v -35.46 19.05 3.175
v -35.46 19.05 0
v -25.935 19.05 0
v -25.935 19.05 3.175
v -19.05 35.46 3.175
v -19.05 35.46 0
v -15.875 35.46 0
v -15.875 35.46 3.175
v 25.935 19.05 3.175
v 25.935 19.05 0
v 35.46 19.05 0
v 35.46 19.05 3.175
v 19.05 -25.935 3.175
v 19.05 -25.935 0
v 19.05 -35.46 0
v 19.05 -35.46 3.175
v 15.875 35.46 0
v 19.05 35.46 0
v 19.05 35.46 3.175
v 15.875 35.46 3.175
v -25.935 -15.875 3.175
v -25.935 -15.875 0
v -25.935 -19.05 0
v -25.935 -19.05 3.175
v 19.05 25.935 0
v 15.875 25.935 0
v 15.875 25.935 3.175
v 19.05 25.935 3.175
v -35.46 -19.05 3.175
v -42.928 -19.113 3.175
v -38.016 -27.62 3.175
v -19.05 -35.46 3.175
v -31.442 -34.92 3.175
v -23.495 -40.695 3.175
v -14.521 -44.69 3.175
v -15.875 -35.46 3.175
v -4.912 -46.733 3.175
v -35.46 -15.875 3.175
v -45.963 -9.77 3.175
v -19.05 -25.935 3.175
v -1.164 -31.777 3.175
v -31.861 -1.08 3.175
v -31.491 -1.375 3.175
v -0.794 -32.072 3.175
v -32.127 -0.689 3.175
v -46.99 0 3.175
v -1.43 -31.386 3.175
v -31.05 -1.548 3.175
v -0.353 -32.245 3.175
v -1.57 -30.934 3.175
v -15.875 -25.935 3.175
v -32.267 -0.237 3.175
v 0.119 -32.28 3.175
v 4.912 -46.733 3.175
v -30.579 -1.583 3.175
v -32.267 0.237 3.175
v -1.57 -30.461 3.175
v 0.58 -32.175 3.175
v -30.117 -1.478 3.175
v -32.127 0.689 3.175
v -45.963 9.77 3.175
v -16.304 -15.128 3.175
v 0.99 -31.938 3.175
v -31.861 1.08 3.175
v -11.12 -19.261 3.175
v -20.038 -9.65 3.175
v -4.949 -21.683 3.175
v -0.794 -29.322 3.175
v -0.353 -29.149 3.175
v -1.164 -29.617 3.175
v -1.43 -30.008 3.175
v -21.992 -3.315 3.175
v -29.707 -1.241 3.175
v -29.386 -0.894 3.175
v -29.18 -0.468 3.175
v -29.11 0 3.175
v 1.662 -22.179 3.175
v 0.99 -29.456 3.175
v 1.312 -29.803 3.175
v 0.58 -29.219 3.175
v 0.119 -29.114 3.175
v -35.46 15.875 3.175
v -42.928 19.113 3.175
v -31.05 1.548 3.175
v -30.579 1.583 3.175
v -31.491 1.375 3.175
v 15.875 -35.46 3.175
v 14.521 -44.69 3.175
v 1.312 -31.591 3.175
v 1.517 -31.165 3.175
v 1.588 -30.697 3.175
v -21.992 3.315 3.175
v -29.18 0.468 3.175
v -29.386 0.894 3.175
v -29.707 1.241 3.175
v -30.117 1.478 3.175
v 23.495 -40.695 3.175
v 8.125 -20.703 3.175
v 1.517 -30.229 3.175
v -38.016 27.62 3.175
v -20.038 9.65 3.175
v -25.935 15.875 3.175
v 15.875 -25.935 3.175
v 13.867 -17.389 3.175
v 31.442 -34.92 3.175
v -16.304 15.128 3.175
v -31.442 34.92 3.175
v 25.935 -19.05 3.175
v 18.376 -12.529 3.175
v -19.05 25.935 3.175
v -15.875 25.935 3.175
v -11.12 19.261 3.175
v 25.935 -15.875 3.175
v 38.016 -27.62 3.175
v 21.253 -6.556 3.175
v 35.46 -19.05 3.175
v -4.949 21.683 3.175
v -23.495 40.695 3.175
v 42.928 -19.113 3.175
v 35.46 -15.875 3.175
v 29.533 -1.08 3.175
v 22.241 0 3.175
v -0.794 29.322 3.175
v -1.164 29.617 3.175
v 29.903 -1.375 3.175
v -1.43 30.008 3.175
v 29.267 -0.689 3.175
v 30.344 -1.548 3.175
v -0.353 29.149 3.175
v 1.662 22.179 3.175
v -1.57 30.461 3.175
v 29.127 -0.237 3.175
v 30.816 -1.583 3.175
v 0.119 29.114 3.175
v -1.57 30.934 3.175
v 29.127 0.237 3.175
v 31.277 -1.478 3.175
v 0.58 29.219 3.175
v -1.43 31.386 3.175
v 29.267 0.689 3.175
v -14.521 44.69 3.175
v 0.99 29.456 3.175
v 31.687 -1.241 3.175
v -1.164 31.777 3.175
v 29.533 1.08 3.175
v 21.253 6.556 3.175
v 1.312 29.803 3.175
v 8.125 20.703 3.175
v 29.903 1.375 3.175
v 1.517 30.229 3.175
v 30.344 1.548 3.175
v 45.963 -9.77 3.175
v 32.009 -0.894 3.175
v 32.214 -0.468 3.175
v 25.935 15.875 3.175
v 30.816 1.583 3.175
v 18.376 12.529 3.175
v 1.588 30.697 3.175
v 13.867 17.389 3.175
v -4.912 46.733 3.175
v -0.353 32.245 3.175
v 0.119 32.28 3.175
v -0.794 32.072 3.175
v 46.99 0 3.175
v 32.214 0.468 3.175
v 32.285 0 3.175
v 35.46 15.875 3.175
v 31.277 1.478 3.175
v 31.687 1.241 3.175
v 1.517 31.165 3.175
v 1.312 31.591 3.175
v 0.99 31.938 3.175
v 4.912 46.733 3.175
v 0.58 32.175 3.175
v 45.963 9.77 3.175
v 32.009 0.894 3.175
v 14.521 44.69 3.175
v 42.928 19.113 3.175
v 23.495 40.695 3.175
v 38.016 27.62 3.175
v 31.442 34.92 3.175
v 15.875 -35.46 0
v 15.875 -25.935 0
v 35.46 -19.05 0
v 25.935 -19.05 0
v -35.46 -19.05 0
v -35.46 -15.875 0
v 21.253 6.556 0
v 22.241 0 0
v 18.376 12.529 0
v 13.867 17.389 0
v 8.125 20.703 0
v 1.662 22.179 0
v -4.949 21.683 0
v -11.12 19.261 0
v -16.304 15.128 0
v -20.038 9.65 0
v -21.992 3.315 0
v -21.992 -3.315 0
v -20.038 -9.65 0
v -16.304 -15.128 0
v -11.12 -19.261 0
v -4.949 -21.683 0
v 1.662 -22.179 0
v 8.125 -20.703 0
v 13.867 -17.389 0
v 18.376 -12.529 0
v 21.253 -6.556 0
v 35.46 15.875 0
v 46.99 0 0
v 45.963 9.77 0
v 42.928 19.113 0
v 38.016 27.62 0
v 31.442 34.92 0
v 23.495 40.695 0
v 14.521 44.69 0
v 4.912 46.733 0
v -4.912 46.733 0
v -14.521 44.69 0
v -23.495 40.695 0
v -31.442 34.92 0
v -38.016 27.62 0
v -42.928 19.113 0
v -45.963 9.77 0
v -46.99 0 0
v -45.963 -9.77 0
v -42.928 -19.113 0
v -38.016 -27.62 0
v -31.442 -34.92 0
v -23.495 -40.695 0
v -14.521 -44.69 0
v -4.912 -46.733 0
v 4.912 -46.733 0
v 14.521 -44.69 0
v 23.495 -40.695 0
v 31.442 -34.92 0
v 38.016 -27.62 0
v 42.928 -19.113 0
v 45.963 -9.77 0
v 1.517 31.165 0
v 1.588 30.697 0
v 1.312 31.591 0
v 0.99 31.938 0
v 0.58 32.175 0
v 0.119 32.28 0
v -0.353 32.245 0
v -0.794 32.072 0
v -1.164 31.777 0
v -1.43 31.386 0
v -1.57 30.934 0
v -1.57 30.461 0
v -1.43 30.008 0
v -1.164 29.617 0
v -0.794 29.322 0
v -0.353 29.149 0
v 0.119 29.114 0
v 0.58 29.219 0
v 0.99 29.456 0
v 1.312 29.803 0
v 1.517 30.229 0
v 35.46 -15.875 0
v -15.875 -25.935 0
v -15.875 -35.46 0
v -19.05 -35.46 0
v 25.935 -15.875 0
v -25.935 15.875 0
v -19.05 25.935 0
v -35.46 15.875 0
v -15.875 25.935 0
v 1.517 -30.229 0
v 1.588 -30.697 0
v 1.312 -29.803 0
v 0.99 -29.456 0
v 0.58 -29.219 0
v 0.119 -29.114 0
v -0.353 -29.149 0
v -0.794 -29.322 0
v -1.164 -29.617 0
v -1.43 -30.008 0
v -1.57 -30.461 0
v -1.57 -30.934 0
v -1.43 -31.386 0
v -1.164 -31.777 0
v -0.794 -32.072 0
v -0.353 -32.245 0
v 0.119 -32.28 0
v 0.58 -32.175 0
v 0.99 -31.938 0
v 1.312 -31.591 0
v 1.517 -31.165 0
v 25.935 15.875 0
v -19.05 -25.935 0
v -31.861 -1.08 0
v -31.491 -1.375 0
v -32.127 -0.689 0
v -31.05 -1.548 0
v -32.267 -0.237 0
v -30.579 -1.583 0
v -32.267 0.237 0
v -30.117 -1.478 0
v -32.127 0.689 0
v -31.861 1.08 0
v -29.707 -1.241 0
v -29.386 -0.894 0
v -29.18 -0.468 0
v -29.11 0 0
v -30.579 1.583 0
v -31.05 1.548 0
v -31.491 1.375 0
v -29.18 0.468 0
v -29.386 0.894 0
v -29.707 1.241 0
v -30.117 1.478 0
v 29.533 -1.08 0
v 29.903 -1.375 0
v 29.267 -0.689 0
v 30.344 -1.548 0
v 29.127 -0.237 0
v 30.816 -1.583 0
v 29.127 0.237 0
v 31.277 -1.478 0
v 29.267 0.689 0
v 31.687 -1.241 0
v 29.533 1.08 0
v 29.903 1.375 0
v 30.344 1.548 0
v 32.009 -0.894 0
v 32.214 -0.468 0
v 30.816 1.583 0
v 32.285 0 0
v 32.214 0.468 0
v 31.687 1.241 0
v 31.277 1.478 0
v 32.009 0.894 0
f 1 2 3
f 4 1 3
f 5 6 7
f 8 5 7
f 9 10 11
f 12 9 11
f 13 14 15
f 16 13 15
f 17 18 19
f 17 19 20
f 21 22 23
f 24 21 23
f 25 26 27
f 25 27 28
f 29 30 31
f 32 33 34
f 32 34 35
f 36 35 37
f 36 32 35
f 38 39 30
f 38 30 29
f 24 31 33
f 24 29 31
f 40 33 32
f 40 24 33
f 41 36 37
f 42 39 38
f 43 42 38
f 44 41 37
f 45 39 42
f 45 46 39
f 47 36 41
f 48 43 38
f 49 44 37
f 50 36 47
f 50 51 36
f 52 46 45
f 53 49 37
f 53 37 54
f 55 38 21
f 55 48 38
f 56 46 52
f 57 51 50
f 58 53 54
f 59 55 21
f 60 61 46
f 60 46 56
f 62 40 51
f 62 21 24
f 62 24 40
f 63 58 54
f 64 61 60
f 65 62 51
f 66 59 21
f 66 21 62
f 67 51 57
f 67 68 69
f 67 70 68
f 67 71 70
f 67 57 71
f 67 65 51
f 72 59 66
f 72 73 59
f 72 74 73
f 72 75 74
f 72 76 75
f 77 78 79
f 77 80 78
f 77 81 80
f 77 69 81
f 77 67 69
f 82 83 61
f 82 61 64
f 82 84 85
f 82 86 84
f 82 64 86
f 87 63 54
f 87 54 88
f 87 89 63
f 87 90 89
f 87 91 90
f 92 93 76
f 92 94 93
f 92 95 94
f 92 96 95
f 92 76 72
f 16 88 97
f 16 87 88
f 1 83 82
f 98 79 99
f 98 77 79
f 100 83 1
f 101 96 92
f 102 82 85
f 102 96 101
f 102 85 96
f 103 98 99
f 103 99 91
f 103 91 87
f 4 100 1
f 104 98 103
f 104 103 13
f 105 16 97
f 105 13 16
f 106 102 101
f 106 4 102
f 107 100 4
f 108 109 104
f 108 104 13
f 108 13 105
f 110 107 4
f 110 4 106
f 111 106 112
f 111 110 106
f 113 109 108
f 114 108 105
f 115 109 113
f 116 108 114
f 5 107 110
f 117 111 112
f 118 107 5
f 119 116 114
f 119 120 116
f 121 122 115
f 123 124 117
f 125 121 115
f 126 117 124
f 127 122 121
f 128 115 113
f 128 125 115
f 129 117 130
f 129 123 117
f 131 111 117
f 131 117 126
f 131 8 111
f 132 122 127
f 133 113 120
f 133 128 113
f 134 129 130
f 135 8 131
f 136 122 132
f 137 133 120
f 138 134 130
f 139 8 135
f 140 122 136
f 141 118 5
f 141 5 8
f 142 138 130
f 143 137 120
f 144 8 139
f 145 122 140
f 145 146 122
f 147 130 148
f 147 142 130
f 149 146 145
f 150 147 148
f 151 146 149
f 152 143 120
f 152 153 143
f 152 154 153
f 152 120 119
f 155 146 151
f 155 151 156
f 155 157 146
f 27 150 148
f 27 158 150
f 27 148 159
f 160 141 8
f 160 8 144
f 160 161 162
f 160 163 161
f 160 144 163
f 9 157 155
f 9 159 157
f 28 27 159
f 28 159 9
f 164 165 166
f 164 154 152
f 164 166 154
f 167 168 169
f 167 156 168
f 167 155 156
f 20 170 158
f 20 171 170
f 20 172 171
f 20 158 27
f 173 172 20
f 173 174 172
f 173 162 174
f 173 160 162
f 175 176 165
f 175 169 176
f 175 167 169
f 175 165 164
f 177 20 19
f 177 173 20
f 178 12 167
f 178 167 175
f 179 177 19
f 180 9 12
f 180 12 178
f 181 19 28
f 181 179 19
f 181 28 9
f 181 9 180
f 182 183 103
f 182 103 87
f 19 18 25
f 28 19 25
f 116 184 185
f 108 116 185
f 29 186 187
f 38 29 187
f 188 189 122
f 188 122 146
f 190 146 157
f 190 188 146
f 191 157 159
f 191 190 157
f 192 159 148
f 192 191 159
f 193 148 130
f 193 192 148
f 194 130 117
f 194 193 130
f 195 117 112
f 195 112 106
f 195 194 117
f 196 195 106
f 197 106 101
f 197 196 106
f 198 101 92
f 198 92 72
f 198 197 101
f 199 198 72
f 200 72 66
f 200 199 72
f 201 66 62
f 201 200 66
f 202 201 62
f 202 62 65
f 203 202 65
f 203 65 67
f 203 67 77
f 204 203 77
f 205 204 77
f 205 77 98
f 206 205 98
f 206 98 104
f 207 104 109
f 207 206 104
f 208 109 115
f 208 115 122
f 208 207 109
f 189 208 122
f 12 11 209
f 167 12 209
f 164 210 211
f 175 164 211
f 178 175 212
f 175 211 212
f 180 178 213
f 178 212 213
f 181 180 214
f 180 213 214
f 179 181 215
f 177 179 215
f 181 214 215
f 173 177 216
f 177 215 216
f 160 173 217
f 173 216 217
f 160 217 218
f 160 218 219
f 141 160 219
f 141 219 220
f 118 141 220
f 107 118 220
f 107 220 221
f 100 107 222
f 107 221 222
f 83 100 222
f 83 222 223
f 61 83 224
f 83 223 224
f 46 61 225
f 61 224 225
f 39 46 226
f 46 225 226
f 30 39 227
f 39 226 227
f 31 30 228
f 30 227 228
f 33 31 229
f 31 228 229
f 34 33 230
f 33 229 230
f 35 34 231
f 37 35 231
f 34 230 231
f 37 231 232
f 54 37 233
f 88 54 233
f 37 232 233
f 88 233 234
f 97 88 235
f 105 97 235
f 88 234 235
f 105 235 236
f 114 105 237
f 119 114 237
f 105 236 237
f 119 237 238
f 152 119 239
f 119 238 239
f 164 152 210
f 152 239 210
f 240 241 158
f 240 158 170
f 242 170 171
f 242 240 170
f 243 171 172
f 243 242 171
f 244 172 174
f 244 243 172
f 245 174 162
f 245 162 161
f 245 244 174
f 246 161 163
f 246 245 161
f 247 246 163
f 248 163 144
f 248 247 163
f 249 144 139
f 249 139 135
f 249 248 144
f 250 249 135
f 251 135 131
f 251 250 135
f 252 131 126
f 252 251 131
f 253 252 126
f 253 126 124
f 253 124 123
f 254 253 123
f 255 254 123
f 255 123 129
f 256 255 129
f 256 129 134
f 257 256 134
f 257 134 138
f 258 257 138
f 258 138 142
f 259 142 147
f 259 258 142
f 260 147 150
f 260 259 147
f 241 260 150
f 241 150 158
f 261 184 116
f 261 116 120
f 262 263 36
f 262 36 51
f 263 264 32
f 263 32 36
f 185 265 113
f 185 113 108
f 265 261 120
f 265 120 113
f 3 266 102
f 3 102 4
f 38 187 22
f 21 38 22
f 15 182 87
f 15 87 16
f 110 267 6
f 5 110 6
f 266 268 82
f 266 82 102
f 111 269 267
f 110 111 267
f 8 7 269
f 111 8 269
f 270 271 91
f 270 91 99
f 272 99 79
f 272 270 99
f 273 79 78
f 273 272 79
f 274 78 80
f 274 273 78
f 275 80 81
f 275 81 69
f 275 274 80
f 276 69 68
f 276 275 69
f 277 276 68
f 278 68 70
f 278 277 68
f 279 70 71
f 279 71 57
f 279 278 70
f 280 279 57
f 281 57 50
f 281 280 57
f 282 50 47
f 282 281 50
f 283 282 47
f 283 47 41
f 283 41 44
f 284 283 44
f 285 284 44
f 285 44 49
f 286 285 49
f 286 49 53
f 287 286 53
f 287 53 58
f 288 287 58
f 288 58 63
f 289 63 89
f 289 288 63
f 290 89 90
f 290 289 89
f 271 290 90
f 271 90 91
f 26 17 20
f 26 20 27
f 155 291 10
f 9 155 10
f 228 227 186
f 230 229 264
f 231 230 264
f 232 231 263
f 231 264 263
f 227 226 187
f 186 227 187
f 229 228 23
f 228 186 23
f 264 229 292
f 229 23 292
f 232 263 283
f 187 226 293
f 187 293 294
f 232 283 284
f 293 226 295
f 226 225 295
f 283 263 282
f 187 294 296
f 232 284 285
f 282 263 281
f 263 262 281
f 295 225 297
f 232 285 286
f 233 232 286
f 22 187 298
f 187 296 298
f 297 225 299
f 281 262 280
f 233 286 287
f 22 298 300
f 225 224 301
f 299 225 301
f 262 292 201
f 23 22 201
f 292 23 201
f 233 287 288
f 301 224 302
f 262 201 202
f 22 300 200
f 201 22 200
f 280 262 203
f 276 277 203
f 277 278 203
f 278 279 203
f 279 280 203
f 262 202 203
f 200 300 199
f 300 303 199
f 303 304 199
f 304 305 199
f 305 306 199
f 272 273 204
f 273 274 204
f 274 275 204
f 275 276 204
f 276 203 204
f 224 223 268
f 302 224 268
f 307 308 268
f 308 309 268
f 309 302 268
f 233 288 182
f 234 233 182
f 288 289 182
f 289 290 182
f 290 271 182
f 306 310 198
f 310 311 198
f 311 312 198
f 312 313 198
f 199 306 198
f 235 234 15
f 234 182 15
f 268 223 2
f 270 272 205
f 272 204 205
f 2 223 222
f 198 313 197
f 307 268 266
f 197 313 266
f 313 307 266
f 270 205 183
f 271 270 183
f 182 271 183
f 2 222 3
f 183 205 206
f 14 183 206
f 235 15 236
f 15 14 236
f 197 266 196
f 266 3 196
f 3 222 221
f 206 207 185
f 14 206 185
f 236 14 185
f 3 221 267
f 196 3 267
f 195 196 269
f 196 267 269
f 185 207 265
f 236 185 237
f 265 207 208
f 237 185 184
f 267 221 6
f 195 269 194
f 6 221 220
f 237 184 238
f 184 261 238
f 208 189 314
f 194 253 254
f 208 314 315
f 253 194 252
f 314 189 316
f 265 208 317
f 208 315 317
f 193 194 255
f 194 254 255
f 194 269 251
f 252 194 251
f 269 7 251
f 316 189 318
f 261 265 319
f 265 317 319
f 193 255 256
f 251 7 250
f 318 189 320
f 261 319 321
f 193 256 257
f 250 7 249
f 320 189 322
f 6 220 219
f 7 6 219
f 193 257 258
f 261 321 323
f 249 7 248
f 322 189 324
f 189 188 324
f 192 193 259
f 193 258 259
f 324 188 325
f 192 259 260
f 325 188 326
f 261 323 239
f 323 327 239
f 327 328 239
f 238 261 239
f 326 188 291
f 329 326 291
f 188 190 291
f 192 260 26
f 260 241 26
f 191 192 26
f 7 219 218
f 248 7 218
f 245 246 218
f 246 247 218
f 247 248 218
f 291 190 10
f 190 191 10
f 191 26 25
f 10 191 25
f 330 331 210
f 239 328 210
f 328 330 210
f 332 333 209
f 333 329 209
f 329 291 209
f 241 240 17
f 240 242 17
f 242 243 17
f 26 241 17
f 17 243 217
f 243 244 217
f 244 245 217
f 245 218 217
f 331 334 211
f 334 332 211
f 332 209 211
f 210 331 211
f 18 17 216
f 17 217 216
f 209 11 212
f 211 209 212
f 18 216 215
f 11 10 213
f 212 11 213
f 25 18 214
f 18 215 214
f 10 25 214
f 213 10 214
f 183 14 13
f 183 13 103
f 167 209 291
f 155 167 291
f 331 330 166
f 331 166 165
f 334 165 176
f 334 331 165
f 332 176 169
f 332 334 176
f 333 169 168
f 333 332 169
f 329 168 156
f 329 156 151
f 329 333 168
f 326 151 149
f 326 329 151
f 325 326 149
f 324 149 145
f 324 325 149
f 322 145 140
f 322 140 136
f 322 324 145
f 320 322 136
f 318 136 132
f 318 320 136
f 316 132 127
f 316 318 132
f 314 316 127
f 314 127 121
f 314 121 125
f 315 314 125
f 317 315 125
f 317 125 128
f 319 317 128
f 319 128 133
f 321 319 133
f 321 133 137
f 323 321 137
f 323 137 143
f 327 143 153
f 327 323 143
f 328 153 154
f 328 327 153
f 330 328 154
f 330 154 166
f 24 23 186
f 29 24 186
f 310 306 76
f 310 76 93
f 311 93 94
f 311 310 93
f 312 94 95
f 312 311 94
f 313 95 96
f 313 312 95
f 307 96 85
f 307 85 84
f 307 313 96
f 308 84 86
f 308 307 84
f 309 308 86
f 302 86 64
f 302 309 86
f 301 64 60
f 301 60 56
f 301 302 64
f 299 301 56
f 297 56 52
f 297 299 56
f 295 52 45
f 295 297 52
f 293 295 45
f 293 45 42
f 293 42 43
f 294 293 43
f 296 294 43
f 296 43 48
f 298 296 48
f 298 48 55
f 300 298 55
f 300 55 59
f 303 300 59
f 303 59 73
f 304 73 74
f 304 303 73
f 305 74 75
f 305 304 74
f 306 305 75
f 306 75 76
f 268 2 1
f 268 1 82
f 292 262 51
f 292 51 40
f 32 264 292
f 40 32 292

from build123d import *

# Parameters (mm, degrees)
SKETCH2_R           = 46.99
SKETCH2_R_2         = 1.5875
SKETCH2_R_3         = 22.240762899
BOSS_EXTRUDE1_DEPTH = 3.175


with BuildPart() as part:
    # Sketch2 → Boss-Extrude1 (new body)
    with BuildSketch(Plane.XY):
        Circle(SKETCH2_R)
        with Locations((0, -30.69717)):
            Circle(SKETCH2_R_2, mode=Mode.SUBTRACT)
        with Locations((0, 30.69717)):
            Circle(SKETCH2_R_2, mode=Mode.SUBTRACT)
        with Locations((30.69717, 0)):
            Circle(SKETCH2_R_2, mode=Mode.SUBTRACT)
        with Locations((-30.69717, 0)):
            Circle(SKETCH2_R_2, mode=Mode.SUBTRACT)
        Circle(SKETCH2_R_3, mode=Mode.SUBTRACT)
        Polygon((-19.05, -35.45967), (-15.875, -35.45967), (-15.875, -25.93467), (-19.05, -25.93467), (-19.05, -32.28467), align=None, mode=Mode.SUBTRACT)
        Polygon((-19.05, 32.28467), (-19.05, 35.45967), (-15.875, 35.45967), (-15.875, 25.93467), (-19.05, 25.93467), align=None, mode=Mode.SUBTRACT)
        Polygon((19.05, 35.45967), (15.875, 35.45967), (15.875, 25.93467), (19.05, 25.93467), (19.05, 32.28467), align=None, mode=Mode.SUBTRACT)
        Polygon((19.05, -32.28467), (19.05, -25.93467), (15.875, -25.93467), (15.875, -35.45967), (19.05, -35.45967), align=None, mode=Mode.SUBTRACT)
        Polygon((-35.45967, -19.05), (-35.45967, -15.875), (-25.93467, -15.875), (-25.93467, -19.05), (-32.28467, -19.05), align=None, mode=Mode.SUBTRACT)
        Polygon((-32.28467, 19.05), (-35.45967, 19.05), (-35.45967, 15.875), (-25.93467, 15.875), (-25.93467, 19.05), align=None, mode=Mode.SUBTRACT)
        Polygon((35.45967, 19.05), (35.45967, 15.875), (25.93467, 15.875), (25.93467, 19.05), (32.28467, 19.05), align=None, mode=Mode.SUBTRACT)
        Polygon((32.28467, -19.05), (35.45967, -19.05), (35.45967, -15.875), (25.93467, -15.875), (25.93467, -19.05), align=None, mode=Mode.SUBTRACT)
    extrude(amount=BOSS_EXTRUDE1_DEPTH)


solid = part.part
